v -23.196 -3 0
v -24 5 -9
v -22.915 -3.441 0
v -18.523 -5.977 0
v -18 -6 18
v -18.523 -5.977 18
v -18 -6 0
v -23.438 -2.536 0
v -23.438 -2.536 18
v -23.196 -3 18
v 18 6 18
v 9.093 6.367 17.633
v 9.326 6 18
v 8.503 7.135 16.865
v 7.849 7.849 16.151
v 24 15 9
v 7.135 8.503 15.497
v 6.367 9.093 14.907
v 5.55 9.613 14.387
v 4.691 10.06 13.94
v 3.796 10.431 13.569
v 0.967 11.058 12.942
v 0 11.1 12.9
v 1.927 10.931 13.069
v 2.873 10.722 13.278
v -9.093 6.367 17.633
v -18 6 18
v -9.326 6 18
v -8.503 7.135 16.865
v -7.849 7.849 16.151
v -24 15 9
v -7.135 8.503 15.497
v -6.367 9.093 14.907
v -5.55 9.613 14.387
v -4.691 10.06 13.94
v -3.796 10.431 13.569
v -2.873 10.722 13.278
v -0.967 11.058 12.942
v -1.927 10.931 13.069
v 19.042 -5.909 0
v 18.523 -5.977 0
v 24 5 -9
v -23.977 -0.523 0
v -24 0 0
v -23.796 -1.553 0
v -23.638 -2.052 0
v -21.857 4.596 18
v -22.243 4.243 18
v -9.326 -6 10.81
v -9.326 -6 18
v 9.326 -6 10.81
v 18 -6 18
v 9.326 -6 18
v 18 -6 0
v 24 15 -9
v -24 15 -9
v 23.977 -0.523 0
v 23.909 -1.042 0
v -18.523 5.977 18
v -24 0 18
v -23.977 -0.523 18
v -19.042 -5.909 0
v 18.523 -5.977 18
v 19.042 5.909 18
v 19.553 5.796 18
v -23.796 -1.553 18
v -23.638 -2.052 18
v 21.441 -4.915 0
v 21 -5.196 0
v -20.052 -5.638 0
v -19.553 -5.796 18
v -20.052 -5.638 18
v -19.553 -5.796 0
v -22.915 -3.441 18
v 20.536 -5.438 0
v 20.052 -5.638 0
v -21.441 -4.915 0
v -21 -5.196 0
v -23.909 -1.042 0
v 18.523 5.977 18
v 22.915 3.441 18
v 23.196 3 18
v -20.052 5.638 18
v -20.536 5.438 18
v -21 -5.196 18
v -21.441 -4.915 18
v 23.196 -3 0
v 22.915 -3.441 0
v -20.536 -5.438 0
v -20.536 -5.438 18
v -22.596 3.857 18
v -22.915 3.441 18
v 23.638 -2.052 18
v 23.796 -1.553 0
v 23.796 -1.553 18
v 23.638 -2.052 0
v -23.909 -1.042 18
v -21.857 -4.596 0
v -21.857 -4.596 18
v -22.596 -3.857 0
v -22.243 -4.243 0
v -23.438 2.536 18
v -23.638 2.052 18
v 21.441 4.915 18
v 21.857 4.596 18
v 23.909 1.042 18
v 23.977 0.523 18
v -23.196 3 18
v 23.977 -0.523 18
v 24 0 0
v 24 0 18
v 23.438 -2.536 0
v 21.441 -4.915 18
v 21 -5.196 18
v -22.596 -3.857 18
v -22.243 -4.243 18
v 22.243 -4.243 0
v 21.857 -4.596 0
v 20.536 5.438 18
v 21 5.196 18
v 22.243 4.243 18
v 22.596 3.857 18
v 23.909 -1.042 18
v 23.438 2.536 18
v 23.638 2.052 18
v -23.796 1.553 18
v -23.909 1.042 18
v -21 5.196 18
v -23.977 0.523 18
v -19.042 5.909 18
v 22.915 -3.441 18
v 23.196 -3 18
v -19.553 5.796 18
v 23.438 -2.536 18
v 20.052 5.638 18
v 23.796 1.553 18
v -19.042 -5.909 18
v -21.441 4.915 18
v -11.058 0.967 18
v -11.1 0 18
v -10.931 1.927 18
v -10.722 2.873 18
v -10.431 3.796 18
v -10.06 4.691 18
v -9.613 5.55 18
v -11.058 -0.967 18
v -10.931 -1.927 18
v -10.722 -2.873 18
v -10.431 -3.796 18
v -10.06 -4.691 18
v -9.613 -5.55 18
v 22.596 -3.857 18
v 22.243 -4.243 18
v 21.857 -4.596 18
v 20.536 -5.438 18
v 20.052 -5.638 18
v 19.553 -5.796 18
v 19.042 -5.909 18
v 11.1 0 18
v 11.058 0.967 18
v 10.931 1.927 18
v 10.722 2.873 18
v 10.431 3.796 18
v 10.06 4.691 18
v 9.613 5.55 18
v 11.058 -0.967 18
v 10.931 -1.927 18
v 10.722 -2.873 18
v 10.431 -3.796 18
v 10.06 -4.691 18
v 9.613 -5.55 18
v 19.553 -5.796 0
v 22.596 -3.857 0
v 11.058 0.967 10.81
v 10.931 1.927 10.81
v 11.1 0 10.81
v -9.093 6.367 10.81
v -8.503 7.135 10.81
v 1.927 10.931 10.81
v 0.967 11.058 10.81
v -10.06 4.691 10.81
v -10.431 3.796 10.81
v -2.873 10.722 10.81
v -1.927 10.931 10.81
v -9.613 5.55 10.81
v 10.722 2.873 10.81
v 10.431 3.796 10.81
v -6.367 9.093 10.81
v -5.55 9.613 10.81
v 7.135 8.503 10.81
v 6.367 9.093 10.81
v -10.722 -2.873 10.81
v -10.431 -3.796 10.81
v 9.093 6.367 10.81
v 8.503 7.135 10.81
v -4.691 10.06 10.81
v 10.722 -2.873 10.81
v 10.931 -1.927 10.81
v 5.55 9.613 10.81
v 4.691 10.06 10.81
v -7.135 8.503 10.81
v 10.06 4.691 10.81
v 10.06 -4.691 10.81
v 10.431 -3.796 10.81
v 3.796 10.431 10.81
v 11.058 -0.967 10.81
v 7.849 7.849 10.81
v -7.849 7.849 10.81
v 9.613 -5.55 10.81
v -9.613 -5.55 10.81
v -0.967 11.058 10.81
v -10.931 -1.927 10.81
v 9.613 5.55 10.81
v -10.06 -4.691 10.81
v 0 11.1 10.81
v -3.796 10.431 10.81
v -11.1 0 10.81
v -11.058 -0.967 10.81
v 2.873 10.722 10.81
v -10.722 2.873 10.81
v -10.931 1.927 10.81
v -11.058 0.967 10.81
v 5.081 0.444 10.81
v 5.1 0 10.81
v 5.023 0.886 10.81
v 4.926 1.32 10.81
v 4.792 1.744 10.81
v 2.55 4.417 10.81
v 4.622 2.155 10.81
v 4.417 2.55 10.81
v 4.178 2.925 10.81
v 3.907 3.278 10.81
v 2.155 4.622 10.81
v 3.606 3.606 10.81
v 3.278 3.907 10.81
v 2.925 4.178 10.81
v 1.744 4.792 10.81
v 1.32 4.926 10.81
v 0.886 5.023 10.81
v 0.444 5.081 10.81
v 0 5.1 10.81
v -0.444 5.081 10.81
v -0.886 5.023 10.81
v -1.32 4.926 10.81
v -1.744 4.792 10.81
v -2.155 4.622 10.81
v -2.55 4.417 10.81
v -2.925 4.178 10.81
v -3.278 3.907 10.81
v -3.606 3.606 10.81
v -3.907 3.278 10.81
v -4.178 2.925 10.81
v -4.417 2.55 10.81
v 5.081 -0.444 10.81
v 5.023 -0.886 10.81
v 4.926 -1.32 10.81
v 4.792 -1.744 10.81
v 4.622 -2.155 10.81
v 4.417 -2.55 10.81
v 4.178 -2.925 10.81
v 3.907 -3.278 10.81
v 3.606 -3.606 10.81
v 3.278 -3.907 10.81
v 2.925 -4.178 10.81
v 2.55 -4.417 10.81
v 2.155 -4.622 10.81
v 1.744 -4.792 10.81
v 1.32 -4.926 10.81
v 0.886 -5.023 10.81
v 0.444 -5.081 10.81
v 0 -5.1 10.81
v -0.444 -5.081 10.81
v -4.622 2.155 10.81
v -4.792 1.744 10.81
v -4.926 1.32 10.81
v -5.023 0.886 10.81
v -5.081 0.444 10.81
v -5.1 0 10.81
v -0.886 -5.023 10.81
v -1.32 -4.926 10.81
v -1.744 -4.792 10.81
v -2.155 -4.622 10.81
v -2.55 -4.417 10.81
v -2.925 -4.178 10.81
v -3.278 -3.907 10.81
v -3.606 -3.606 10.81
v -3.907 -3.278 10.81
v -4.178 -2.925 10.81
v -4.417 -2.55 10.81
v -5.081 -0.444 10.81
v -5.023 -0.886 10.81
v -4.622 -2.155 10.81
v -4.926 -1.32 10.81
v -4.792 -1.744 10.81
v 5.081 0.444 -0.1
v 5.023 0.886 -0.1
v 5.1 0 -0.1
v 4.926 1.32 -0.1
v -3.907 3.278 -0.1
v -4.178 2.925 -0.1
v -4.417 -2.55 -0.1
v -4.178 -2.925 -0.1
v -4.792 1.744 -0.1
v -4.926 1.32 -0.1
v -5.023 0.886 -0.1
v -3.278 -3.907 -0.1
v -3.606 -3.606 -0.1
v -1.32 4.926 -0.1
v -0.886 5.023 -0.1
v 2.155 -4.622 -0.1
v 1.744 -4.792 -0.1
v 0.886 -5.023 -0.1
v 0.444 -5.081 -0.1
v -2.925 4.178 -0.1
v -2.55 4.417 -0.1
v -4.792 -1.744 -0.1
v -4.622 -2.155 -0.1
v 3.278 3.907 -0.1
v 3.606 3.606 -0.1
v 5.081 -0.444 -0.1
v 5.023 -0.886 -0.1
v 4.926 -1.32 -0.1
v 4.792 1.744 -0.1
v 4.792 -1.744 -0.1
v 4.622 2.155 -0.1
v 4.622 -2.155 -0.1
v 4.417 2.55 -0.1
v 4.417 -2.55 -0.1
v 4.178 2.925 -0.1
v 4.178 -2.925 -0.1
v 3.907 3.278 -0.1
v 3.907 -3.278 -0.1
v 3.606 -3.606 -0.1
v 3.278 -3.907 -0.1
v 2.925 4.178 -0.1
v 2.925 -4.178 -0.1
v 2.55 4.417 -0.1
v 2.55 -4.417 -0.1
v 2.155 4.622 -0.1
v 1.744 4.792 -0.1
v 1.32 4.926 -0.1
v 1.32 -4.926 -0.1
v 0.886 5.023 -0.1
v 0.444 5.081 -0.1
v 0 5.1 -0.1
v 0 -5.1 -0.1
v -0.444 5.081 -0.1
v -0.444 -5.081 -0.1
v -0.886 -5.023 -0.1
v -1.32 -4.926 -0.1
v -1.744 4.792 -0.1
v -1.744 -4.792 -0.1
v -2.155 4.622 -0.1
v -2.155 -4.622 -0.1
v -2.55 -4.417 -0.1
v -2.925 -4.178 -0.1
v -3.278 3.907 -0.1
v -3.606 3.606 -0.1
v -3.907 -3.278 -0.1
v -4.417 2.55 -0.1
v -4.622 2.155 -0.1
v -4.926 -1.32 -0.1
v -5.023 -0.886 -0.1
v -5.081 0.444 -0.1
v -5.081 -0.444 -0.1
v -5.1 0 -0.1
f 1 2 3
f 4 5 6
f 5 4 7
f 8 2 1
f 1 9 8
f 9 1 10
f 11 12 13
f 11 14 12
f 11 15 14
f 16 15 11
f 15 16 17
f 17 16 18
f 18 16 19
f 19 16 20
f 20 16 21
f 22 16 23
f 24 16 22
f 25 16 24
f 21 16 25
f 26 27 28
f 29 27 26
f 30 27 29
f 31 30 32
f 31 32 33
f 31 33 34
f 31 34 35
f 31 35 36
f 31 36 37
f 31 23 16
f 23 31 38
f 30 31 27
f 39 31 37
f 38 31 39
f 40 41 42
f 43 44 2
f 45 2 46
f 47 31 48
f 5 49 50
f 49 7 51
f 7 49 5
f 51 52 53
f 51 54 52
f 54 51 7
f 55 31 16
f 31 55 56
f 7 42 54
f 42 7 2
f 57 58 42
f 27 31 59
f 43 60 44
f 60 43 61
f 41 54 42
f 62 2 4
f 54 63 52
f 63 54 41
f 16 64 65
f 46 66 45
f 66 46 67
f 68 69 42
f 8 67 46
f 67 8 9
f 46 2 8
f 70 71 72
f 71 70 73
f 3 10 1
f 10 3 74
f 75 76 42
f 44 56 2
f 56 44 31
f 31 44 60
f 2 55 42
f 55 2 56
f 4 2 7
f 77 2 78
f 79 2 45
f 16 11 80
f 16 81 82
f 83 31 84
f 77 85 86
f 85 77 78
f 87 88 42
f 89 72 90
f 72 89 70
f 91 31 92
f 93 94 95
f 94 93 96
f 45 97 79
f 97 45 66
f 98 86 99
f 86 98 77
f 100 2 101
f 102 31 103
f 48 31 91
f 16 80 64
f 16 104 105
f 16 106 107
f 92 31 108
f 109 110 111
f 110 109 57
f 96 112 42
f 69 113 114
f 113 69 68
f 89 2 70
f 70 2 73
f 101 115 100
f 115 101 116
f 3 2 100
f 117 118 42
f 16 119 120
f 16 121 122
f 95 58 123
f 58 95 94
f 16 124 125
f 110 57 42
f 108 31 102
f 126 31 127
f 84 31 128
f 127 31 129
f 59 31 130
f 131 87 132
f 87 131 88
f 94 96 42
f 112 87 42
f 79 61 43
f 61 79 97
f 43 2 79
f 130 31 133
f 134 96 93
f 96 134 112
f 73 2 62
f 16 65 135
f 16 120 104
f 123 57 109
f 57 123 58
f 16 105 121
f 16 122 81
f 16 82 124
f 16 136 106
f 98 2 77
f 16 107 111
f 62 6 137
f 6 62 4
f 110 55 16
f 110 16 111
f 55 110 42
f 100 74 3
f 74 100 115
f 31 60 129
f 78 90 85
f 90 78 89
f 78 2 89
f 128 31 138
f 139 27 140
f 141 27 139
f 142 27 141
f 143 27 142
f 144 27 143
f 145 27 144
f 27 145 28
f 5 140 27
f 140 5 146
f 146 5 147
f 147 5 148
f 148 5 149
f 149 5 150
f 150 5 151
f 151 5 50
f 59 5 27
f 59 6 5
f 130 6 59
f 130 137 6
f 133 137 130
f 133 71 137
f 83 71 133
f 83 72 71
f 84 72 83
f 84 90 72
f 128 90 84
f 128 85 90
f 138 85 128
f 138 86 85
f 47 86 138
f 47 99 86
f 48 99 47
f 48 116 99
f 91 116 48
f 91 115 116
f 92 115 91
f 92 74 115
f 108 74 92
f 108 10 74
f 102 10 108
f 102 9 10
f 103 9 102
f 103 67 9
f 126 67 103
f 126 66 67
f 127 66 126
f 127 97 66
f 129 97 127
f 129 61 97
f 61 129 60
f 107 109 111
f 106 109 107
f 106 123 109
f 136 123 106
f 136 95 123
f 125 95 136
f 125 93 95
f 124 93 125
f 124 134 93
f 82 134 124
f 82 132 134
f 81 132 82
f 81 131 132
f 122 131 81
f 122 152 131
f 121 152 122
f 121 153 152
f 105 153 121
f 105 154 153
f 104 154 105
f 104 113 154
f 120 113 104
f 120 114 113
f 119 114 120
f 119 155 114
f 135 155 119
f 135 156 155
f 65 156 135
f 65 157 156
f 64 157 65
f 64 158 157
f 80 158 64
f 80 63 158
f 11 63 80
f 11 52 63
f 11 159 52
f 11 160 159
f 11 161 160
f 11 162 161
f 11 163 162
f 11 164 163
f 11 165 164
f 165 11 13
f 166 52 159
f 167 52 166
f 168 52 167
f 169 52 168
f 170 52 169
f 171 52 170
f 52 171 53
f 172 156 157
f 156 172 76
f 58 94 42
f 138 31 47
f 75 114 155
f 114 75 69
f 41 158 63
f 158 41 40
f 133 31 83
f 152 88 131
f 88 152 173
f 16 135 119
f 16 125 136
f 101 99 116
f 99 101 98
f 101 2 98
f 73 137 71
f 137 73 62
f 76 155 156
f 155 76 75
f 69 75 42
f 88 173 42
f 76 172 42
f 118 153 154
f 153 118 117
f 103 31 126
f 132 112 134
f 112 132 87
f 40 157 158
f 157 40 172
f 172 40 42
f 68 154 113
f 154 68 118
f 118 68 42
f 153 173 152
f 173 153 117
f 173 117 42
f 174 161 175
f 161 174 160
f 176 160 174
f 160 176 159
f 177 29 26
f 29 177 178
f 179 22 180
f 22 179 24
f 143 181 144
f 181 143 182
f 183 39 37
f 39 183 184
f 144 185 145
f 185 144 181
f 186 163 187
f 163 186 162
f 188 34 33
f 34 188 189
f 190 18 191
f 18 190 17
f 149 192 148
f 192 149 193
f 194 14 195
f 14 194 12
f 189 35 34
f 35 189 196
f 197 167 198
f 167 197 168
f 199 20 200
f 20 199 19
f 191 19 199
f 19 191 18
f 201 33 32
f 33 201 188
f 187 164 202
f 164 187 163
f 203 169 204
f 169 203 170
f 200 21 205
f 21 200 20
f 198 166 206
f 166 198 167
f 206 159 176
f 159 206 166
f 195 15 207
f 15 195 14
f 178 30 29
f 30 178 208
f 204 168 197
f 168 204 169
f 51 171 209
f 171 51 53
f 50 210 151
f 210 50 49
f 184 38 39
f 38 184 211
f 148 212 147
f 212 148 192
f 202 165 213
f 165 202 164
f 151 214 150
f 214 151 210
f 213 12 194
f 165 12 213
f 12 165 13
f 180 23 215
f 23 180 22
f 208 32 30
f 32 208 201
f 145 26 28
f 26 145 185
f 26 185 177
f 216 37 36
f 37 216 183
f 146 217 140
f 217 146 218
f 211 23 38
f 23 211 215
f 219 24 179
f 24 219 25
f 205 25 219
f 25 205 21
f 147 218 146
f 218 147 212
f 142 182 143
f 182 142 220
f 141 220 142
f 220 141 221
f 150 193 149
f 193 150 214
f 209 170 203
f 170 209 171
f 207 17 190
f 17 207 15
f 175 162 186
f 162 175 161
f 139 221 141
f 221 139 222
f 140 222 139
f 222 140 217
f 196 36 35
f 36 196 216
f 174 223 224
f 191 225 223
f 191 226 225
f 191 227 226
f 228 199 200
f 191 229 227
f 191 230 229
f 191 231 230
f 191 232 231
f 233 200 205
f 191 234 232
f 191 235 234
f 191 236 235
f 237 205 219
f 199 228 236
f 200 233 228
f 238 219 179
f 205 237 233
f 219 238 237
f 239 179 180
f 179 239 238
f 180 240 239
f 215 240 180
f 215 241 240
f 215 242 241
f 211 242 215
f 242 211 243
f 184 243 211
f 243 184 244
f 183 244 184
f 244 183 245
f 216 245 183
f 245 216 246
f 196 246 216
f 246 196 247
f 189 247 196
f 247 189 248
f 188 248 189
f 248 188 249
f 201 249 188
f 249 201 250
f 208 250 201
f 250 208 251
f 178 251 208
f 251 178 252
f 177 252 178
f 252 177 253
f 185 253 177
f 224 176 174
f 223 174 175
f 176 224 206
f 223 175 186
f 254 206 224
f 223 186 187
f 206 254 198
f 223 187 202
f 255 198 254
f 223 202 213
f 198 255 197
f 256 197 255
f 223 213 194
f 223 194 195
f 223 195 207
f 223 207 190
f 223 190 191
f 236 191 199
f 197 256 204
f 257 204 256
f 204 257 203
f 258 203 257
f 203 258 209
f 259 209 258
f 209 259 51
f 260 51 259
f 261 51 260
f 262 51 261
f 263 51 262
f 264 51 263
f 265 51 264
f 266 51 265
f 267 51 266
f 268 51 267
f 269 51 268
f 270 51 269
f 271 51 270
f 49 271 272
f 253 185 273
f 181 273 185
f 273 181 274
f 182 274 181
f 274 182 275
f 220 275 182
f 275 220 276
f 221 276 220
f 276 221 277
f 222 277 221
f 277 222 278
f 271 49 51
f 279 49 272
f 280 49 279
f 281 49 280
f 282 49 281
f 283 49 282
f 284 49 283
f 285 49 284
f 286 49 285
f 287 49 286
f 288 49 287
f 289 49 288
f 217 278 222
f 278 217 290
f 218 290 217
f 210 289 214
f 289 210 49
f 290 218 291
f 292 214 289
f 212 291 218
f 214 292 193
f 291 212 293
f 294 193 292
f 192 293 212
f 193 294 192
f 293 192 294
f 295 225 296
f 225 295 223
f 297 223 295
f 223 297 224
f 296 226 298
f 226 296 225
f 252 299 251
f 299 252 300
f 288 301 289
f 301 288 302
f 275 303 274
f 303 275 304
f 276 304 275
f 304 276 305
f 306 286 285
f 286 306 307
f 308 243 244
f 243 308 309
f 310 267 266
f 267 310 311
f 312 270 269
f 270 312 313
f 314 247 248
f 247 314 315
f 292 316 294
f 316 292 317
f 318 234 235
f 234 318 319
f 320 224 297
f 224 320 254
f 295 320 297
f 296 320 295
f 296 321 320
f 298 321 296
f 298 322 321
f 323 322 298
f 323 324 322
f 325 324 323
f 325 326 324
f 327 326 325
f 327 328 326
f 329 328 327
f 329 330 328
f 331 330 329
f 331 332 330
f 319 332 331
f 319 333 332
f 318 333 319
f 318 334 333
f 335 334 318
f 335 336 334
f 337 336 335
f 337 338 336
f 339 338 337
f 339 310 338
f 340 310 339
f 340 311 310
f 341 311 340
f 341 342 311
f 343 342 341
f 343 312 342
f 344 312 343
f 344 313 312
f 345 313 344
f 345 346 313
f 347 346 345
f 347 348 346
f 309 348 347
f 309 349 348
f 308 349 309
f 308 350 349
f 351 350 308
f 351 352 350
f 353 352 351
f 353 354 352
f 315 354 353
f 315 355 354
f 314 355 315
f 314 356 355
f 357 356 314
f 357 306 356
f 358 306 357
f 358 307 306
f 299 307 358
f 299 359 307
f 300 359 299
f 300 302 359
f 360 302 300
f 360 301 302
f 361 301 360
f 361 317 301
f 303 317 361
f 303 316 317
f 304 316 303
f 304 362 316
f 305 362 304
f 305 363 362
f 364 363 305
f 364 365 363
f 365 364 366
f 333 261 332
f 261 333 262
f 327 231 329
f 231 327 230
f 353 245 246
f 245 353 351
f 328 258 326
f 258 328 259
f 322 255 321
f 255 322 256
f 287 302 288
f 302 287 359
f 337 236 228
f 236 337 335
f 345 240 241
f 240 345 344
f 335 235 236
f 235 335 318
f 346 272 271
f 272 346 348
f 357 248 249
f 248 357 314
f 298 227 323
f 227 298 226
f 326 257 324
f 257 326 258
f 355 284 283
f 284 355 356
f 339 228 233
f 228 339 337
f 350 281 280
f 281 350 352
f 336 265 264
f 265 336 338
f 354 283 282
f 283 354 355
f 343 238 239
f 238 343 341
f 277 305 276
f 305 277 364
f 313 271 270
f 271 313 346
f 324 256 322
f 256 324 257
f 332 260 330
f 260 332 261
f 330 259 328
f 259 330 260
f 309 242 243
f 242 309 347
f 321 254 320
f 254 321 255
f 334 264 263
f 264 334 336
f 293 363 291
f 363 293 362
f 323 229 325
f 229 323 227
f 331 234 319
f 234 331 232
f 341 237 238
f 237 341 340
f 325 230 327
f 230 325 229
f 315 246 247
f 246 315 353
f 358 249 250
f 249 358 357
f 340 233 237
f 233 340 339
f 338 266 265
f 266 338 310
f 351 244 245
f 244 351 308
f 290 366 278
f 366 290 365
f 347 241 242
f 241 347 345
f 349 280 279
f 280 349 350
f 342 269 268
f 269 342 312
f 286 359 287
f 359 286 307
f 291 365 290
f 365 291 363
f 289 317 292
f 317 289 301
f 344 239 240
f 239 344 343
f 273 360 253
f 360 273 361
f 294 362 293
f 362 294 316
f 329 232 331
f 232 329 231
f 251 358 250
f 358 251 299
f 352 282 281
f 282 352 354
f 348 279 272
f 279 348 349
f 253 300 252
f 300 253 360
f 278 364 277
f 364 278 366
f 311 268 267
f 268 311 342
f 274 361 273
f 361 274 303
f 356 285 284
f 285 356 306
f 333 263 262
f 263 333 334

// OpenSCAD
// CYD Satellite Tracker — 608 bearing pillow block
// Conceptual PETG/ASA bracket. Verify bearing fit and fastener dimensions before use.
$fn=72;
bearing_od=22.2;       // nominal 608 OD 22 mm + clearance
bearing_width=7.2;
block_w=48; block_h=30; block_d=18;
mount_spacing=32; mount_hole=5.2;
wall=5;
difference(){
  hull(){
    translate([-block_w/2+6,0,0]) cylinder(h=block_d,d=12);
    translate([ block_w/2-6,0,0]) cylinder(h=block_d,d=12);
    translate([0,block_h/2-5,0]) cube([block_w,10,block_d],center=true);
  }
  // Bearing seat, axis along Z
  translate([0,0,block_d-bearing_width+0.01]) cylinder(h=bearing_width+0.2,d=bearing_od);
  translate([0,0,-0.1]) cylinder(h=block_d+0.2,d=10.2);
  for(x=[-mount_spacing/2,mount_spacing/2])
    translate([x,-block_h/2+4,-0.1]) cylinder(h=block_d+0.2,d=mount_hole);
}
// Bearing itself is intentionally not included; use a standard 608 bearing.
